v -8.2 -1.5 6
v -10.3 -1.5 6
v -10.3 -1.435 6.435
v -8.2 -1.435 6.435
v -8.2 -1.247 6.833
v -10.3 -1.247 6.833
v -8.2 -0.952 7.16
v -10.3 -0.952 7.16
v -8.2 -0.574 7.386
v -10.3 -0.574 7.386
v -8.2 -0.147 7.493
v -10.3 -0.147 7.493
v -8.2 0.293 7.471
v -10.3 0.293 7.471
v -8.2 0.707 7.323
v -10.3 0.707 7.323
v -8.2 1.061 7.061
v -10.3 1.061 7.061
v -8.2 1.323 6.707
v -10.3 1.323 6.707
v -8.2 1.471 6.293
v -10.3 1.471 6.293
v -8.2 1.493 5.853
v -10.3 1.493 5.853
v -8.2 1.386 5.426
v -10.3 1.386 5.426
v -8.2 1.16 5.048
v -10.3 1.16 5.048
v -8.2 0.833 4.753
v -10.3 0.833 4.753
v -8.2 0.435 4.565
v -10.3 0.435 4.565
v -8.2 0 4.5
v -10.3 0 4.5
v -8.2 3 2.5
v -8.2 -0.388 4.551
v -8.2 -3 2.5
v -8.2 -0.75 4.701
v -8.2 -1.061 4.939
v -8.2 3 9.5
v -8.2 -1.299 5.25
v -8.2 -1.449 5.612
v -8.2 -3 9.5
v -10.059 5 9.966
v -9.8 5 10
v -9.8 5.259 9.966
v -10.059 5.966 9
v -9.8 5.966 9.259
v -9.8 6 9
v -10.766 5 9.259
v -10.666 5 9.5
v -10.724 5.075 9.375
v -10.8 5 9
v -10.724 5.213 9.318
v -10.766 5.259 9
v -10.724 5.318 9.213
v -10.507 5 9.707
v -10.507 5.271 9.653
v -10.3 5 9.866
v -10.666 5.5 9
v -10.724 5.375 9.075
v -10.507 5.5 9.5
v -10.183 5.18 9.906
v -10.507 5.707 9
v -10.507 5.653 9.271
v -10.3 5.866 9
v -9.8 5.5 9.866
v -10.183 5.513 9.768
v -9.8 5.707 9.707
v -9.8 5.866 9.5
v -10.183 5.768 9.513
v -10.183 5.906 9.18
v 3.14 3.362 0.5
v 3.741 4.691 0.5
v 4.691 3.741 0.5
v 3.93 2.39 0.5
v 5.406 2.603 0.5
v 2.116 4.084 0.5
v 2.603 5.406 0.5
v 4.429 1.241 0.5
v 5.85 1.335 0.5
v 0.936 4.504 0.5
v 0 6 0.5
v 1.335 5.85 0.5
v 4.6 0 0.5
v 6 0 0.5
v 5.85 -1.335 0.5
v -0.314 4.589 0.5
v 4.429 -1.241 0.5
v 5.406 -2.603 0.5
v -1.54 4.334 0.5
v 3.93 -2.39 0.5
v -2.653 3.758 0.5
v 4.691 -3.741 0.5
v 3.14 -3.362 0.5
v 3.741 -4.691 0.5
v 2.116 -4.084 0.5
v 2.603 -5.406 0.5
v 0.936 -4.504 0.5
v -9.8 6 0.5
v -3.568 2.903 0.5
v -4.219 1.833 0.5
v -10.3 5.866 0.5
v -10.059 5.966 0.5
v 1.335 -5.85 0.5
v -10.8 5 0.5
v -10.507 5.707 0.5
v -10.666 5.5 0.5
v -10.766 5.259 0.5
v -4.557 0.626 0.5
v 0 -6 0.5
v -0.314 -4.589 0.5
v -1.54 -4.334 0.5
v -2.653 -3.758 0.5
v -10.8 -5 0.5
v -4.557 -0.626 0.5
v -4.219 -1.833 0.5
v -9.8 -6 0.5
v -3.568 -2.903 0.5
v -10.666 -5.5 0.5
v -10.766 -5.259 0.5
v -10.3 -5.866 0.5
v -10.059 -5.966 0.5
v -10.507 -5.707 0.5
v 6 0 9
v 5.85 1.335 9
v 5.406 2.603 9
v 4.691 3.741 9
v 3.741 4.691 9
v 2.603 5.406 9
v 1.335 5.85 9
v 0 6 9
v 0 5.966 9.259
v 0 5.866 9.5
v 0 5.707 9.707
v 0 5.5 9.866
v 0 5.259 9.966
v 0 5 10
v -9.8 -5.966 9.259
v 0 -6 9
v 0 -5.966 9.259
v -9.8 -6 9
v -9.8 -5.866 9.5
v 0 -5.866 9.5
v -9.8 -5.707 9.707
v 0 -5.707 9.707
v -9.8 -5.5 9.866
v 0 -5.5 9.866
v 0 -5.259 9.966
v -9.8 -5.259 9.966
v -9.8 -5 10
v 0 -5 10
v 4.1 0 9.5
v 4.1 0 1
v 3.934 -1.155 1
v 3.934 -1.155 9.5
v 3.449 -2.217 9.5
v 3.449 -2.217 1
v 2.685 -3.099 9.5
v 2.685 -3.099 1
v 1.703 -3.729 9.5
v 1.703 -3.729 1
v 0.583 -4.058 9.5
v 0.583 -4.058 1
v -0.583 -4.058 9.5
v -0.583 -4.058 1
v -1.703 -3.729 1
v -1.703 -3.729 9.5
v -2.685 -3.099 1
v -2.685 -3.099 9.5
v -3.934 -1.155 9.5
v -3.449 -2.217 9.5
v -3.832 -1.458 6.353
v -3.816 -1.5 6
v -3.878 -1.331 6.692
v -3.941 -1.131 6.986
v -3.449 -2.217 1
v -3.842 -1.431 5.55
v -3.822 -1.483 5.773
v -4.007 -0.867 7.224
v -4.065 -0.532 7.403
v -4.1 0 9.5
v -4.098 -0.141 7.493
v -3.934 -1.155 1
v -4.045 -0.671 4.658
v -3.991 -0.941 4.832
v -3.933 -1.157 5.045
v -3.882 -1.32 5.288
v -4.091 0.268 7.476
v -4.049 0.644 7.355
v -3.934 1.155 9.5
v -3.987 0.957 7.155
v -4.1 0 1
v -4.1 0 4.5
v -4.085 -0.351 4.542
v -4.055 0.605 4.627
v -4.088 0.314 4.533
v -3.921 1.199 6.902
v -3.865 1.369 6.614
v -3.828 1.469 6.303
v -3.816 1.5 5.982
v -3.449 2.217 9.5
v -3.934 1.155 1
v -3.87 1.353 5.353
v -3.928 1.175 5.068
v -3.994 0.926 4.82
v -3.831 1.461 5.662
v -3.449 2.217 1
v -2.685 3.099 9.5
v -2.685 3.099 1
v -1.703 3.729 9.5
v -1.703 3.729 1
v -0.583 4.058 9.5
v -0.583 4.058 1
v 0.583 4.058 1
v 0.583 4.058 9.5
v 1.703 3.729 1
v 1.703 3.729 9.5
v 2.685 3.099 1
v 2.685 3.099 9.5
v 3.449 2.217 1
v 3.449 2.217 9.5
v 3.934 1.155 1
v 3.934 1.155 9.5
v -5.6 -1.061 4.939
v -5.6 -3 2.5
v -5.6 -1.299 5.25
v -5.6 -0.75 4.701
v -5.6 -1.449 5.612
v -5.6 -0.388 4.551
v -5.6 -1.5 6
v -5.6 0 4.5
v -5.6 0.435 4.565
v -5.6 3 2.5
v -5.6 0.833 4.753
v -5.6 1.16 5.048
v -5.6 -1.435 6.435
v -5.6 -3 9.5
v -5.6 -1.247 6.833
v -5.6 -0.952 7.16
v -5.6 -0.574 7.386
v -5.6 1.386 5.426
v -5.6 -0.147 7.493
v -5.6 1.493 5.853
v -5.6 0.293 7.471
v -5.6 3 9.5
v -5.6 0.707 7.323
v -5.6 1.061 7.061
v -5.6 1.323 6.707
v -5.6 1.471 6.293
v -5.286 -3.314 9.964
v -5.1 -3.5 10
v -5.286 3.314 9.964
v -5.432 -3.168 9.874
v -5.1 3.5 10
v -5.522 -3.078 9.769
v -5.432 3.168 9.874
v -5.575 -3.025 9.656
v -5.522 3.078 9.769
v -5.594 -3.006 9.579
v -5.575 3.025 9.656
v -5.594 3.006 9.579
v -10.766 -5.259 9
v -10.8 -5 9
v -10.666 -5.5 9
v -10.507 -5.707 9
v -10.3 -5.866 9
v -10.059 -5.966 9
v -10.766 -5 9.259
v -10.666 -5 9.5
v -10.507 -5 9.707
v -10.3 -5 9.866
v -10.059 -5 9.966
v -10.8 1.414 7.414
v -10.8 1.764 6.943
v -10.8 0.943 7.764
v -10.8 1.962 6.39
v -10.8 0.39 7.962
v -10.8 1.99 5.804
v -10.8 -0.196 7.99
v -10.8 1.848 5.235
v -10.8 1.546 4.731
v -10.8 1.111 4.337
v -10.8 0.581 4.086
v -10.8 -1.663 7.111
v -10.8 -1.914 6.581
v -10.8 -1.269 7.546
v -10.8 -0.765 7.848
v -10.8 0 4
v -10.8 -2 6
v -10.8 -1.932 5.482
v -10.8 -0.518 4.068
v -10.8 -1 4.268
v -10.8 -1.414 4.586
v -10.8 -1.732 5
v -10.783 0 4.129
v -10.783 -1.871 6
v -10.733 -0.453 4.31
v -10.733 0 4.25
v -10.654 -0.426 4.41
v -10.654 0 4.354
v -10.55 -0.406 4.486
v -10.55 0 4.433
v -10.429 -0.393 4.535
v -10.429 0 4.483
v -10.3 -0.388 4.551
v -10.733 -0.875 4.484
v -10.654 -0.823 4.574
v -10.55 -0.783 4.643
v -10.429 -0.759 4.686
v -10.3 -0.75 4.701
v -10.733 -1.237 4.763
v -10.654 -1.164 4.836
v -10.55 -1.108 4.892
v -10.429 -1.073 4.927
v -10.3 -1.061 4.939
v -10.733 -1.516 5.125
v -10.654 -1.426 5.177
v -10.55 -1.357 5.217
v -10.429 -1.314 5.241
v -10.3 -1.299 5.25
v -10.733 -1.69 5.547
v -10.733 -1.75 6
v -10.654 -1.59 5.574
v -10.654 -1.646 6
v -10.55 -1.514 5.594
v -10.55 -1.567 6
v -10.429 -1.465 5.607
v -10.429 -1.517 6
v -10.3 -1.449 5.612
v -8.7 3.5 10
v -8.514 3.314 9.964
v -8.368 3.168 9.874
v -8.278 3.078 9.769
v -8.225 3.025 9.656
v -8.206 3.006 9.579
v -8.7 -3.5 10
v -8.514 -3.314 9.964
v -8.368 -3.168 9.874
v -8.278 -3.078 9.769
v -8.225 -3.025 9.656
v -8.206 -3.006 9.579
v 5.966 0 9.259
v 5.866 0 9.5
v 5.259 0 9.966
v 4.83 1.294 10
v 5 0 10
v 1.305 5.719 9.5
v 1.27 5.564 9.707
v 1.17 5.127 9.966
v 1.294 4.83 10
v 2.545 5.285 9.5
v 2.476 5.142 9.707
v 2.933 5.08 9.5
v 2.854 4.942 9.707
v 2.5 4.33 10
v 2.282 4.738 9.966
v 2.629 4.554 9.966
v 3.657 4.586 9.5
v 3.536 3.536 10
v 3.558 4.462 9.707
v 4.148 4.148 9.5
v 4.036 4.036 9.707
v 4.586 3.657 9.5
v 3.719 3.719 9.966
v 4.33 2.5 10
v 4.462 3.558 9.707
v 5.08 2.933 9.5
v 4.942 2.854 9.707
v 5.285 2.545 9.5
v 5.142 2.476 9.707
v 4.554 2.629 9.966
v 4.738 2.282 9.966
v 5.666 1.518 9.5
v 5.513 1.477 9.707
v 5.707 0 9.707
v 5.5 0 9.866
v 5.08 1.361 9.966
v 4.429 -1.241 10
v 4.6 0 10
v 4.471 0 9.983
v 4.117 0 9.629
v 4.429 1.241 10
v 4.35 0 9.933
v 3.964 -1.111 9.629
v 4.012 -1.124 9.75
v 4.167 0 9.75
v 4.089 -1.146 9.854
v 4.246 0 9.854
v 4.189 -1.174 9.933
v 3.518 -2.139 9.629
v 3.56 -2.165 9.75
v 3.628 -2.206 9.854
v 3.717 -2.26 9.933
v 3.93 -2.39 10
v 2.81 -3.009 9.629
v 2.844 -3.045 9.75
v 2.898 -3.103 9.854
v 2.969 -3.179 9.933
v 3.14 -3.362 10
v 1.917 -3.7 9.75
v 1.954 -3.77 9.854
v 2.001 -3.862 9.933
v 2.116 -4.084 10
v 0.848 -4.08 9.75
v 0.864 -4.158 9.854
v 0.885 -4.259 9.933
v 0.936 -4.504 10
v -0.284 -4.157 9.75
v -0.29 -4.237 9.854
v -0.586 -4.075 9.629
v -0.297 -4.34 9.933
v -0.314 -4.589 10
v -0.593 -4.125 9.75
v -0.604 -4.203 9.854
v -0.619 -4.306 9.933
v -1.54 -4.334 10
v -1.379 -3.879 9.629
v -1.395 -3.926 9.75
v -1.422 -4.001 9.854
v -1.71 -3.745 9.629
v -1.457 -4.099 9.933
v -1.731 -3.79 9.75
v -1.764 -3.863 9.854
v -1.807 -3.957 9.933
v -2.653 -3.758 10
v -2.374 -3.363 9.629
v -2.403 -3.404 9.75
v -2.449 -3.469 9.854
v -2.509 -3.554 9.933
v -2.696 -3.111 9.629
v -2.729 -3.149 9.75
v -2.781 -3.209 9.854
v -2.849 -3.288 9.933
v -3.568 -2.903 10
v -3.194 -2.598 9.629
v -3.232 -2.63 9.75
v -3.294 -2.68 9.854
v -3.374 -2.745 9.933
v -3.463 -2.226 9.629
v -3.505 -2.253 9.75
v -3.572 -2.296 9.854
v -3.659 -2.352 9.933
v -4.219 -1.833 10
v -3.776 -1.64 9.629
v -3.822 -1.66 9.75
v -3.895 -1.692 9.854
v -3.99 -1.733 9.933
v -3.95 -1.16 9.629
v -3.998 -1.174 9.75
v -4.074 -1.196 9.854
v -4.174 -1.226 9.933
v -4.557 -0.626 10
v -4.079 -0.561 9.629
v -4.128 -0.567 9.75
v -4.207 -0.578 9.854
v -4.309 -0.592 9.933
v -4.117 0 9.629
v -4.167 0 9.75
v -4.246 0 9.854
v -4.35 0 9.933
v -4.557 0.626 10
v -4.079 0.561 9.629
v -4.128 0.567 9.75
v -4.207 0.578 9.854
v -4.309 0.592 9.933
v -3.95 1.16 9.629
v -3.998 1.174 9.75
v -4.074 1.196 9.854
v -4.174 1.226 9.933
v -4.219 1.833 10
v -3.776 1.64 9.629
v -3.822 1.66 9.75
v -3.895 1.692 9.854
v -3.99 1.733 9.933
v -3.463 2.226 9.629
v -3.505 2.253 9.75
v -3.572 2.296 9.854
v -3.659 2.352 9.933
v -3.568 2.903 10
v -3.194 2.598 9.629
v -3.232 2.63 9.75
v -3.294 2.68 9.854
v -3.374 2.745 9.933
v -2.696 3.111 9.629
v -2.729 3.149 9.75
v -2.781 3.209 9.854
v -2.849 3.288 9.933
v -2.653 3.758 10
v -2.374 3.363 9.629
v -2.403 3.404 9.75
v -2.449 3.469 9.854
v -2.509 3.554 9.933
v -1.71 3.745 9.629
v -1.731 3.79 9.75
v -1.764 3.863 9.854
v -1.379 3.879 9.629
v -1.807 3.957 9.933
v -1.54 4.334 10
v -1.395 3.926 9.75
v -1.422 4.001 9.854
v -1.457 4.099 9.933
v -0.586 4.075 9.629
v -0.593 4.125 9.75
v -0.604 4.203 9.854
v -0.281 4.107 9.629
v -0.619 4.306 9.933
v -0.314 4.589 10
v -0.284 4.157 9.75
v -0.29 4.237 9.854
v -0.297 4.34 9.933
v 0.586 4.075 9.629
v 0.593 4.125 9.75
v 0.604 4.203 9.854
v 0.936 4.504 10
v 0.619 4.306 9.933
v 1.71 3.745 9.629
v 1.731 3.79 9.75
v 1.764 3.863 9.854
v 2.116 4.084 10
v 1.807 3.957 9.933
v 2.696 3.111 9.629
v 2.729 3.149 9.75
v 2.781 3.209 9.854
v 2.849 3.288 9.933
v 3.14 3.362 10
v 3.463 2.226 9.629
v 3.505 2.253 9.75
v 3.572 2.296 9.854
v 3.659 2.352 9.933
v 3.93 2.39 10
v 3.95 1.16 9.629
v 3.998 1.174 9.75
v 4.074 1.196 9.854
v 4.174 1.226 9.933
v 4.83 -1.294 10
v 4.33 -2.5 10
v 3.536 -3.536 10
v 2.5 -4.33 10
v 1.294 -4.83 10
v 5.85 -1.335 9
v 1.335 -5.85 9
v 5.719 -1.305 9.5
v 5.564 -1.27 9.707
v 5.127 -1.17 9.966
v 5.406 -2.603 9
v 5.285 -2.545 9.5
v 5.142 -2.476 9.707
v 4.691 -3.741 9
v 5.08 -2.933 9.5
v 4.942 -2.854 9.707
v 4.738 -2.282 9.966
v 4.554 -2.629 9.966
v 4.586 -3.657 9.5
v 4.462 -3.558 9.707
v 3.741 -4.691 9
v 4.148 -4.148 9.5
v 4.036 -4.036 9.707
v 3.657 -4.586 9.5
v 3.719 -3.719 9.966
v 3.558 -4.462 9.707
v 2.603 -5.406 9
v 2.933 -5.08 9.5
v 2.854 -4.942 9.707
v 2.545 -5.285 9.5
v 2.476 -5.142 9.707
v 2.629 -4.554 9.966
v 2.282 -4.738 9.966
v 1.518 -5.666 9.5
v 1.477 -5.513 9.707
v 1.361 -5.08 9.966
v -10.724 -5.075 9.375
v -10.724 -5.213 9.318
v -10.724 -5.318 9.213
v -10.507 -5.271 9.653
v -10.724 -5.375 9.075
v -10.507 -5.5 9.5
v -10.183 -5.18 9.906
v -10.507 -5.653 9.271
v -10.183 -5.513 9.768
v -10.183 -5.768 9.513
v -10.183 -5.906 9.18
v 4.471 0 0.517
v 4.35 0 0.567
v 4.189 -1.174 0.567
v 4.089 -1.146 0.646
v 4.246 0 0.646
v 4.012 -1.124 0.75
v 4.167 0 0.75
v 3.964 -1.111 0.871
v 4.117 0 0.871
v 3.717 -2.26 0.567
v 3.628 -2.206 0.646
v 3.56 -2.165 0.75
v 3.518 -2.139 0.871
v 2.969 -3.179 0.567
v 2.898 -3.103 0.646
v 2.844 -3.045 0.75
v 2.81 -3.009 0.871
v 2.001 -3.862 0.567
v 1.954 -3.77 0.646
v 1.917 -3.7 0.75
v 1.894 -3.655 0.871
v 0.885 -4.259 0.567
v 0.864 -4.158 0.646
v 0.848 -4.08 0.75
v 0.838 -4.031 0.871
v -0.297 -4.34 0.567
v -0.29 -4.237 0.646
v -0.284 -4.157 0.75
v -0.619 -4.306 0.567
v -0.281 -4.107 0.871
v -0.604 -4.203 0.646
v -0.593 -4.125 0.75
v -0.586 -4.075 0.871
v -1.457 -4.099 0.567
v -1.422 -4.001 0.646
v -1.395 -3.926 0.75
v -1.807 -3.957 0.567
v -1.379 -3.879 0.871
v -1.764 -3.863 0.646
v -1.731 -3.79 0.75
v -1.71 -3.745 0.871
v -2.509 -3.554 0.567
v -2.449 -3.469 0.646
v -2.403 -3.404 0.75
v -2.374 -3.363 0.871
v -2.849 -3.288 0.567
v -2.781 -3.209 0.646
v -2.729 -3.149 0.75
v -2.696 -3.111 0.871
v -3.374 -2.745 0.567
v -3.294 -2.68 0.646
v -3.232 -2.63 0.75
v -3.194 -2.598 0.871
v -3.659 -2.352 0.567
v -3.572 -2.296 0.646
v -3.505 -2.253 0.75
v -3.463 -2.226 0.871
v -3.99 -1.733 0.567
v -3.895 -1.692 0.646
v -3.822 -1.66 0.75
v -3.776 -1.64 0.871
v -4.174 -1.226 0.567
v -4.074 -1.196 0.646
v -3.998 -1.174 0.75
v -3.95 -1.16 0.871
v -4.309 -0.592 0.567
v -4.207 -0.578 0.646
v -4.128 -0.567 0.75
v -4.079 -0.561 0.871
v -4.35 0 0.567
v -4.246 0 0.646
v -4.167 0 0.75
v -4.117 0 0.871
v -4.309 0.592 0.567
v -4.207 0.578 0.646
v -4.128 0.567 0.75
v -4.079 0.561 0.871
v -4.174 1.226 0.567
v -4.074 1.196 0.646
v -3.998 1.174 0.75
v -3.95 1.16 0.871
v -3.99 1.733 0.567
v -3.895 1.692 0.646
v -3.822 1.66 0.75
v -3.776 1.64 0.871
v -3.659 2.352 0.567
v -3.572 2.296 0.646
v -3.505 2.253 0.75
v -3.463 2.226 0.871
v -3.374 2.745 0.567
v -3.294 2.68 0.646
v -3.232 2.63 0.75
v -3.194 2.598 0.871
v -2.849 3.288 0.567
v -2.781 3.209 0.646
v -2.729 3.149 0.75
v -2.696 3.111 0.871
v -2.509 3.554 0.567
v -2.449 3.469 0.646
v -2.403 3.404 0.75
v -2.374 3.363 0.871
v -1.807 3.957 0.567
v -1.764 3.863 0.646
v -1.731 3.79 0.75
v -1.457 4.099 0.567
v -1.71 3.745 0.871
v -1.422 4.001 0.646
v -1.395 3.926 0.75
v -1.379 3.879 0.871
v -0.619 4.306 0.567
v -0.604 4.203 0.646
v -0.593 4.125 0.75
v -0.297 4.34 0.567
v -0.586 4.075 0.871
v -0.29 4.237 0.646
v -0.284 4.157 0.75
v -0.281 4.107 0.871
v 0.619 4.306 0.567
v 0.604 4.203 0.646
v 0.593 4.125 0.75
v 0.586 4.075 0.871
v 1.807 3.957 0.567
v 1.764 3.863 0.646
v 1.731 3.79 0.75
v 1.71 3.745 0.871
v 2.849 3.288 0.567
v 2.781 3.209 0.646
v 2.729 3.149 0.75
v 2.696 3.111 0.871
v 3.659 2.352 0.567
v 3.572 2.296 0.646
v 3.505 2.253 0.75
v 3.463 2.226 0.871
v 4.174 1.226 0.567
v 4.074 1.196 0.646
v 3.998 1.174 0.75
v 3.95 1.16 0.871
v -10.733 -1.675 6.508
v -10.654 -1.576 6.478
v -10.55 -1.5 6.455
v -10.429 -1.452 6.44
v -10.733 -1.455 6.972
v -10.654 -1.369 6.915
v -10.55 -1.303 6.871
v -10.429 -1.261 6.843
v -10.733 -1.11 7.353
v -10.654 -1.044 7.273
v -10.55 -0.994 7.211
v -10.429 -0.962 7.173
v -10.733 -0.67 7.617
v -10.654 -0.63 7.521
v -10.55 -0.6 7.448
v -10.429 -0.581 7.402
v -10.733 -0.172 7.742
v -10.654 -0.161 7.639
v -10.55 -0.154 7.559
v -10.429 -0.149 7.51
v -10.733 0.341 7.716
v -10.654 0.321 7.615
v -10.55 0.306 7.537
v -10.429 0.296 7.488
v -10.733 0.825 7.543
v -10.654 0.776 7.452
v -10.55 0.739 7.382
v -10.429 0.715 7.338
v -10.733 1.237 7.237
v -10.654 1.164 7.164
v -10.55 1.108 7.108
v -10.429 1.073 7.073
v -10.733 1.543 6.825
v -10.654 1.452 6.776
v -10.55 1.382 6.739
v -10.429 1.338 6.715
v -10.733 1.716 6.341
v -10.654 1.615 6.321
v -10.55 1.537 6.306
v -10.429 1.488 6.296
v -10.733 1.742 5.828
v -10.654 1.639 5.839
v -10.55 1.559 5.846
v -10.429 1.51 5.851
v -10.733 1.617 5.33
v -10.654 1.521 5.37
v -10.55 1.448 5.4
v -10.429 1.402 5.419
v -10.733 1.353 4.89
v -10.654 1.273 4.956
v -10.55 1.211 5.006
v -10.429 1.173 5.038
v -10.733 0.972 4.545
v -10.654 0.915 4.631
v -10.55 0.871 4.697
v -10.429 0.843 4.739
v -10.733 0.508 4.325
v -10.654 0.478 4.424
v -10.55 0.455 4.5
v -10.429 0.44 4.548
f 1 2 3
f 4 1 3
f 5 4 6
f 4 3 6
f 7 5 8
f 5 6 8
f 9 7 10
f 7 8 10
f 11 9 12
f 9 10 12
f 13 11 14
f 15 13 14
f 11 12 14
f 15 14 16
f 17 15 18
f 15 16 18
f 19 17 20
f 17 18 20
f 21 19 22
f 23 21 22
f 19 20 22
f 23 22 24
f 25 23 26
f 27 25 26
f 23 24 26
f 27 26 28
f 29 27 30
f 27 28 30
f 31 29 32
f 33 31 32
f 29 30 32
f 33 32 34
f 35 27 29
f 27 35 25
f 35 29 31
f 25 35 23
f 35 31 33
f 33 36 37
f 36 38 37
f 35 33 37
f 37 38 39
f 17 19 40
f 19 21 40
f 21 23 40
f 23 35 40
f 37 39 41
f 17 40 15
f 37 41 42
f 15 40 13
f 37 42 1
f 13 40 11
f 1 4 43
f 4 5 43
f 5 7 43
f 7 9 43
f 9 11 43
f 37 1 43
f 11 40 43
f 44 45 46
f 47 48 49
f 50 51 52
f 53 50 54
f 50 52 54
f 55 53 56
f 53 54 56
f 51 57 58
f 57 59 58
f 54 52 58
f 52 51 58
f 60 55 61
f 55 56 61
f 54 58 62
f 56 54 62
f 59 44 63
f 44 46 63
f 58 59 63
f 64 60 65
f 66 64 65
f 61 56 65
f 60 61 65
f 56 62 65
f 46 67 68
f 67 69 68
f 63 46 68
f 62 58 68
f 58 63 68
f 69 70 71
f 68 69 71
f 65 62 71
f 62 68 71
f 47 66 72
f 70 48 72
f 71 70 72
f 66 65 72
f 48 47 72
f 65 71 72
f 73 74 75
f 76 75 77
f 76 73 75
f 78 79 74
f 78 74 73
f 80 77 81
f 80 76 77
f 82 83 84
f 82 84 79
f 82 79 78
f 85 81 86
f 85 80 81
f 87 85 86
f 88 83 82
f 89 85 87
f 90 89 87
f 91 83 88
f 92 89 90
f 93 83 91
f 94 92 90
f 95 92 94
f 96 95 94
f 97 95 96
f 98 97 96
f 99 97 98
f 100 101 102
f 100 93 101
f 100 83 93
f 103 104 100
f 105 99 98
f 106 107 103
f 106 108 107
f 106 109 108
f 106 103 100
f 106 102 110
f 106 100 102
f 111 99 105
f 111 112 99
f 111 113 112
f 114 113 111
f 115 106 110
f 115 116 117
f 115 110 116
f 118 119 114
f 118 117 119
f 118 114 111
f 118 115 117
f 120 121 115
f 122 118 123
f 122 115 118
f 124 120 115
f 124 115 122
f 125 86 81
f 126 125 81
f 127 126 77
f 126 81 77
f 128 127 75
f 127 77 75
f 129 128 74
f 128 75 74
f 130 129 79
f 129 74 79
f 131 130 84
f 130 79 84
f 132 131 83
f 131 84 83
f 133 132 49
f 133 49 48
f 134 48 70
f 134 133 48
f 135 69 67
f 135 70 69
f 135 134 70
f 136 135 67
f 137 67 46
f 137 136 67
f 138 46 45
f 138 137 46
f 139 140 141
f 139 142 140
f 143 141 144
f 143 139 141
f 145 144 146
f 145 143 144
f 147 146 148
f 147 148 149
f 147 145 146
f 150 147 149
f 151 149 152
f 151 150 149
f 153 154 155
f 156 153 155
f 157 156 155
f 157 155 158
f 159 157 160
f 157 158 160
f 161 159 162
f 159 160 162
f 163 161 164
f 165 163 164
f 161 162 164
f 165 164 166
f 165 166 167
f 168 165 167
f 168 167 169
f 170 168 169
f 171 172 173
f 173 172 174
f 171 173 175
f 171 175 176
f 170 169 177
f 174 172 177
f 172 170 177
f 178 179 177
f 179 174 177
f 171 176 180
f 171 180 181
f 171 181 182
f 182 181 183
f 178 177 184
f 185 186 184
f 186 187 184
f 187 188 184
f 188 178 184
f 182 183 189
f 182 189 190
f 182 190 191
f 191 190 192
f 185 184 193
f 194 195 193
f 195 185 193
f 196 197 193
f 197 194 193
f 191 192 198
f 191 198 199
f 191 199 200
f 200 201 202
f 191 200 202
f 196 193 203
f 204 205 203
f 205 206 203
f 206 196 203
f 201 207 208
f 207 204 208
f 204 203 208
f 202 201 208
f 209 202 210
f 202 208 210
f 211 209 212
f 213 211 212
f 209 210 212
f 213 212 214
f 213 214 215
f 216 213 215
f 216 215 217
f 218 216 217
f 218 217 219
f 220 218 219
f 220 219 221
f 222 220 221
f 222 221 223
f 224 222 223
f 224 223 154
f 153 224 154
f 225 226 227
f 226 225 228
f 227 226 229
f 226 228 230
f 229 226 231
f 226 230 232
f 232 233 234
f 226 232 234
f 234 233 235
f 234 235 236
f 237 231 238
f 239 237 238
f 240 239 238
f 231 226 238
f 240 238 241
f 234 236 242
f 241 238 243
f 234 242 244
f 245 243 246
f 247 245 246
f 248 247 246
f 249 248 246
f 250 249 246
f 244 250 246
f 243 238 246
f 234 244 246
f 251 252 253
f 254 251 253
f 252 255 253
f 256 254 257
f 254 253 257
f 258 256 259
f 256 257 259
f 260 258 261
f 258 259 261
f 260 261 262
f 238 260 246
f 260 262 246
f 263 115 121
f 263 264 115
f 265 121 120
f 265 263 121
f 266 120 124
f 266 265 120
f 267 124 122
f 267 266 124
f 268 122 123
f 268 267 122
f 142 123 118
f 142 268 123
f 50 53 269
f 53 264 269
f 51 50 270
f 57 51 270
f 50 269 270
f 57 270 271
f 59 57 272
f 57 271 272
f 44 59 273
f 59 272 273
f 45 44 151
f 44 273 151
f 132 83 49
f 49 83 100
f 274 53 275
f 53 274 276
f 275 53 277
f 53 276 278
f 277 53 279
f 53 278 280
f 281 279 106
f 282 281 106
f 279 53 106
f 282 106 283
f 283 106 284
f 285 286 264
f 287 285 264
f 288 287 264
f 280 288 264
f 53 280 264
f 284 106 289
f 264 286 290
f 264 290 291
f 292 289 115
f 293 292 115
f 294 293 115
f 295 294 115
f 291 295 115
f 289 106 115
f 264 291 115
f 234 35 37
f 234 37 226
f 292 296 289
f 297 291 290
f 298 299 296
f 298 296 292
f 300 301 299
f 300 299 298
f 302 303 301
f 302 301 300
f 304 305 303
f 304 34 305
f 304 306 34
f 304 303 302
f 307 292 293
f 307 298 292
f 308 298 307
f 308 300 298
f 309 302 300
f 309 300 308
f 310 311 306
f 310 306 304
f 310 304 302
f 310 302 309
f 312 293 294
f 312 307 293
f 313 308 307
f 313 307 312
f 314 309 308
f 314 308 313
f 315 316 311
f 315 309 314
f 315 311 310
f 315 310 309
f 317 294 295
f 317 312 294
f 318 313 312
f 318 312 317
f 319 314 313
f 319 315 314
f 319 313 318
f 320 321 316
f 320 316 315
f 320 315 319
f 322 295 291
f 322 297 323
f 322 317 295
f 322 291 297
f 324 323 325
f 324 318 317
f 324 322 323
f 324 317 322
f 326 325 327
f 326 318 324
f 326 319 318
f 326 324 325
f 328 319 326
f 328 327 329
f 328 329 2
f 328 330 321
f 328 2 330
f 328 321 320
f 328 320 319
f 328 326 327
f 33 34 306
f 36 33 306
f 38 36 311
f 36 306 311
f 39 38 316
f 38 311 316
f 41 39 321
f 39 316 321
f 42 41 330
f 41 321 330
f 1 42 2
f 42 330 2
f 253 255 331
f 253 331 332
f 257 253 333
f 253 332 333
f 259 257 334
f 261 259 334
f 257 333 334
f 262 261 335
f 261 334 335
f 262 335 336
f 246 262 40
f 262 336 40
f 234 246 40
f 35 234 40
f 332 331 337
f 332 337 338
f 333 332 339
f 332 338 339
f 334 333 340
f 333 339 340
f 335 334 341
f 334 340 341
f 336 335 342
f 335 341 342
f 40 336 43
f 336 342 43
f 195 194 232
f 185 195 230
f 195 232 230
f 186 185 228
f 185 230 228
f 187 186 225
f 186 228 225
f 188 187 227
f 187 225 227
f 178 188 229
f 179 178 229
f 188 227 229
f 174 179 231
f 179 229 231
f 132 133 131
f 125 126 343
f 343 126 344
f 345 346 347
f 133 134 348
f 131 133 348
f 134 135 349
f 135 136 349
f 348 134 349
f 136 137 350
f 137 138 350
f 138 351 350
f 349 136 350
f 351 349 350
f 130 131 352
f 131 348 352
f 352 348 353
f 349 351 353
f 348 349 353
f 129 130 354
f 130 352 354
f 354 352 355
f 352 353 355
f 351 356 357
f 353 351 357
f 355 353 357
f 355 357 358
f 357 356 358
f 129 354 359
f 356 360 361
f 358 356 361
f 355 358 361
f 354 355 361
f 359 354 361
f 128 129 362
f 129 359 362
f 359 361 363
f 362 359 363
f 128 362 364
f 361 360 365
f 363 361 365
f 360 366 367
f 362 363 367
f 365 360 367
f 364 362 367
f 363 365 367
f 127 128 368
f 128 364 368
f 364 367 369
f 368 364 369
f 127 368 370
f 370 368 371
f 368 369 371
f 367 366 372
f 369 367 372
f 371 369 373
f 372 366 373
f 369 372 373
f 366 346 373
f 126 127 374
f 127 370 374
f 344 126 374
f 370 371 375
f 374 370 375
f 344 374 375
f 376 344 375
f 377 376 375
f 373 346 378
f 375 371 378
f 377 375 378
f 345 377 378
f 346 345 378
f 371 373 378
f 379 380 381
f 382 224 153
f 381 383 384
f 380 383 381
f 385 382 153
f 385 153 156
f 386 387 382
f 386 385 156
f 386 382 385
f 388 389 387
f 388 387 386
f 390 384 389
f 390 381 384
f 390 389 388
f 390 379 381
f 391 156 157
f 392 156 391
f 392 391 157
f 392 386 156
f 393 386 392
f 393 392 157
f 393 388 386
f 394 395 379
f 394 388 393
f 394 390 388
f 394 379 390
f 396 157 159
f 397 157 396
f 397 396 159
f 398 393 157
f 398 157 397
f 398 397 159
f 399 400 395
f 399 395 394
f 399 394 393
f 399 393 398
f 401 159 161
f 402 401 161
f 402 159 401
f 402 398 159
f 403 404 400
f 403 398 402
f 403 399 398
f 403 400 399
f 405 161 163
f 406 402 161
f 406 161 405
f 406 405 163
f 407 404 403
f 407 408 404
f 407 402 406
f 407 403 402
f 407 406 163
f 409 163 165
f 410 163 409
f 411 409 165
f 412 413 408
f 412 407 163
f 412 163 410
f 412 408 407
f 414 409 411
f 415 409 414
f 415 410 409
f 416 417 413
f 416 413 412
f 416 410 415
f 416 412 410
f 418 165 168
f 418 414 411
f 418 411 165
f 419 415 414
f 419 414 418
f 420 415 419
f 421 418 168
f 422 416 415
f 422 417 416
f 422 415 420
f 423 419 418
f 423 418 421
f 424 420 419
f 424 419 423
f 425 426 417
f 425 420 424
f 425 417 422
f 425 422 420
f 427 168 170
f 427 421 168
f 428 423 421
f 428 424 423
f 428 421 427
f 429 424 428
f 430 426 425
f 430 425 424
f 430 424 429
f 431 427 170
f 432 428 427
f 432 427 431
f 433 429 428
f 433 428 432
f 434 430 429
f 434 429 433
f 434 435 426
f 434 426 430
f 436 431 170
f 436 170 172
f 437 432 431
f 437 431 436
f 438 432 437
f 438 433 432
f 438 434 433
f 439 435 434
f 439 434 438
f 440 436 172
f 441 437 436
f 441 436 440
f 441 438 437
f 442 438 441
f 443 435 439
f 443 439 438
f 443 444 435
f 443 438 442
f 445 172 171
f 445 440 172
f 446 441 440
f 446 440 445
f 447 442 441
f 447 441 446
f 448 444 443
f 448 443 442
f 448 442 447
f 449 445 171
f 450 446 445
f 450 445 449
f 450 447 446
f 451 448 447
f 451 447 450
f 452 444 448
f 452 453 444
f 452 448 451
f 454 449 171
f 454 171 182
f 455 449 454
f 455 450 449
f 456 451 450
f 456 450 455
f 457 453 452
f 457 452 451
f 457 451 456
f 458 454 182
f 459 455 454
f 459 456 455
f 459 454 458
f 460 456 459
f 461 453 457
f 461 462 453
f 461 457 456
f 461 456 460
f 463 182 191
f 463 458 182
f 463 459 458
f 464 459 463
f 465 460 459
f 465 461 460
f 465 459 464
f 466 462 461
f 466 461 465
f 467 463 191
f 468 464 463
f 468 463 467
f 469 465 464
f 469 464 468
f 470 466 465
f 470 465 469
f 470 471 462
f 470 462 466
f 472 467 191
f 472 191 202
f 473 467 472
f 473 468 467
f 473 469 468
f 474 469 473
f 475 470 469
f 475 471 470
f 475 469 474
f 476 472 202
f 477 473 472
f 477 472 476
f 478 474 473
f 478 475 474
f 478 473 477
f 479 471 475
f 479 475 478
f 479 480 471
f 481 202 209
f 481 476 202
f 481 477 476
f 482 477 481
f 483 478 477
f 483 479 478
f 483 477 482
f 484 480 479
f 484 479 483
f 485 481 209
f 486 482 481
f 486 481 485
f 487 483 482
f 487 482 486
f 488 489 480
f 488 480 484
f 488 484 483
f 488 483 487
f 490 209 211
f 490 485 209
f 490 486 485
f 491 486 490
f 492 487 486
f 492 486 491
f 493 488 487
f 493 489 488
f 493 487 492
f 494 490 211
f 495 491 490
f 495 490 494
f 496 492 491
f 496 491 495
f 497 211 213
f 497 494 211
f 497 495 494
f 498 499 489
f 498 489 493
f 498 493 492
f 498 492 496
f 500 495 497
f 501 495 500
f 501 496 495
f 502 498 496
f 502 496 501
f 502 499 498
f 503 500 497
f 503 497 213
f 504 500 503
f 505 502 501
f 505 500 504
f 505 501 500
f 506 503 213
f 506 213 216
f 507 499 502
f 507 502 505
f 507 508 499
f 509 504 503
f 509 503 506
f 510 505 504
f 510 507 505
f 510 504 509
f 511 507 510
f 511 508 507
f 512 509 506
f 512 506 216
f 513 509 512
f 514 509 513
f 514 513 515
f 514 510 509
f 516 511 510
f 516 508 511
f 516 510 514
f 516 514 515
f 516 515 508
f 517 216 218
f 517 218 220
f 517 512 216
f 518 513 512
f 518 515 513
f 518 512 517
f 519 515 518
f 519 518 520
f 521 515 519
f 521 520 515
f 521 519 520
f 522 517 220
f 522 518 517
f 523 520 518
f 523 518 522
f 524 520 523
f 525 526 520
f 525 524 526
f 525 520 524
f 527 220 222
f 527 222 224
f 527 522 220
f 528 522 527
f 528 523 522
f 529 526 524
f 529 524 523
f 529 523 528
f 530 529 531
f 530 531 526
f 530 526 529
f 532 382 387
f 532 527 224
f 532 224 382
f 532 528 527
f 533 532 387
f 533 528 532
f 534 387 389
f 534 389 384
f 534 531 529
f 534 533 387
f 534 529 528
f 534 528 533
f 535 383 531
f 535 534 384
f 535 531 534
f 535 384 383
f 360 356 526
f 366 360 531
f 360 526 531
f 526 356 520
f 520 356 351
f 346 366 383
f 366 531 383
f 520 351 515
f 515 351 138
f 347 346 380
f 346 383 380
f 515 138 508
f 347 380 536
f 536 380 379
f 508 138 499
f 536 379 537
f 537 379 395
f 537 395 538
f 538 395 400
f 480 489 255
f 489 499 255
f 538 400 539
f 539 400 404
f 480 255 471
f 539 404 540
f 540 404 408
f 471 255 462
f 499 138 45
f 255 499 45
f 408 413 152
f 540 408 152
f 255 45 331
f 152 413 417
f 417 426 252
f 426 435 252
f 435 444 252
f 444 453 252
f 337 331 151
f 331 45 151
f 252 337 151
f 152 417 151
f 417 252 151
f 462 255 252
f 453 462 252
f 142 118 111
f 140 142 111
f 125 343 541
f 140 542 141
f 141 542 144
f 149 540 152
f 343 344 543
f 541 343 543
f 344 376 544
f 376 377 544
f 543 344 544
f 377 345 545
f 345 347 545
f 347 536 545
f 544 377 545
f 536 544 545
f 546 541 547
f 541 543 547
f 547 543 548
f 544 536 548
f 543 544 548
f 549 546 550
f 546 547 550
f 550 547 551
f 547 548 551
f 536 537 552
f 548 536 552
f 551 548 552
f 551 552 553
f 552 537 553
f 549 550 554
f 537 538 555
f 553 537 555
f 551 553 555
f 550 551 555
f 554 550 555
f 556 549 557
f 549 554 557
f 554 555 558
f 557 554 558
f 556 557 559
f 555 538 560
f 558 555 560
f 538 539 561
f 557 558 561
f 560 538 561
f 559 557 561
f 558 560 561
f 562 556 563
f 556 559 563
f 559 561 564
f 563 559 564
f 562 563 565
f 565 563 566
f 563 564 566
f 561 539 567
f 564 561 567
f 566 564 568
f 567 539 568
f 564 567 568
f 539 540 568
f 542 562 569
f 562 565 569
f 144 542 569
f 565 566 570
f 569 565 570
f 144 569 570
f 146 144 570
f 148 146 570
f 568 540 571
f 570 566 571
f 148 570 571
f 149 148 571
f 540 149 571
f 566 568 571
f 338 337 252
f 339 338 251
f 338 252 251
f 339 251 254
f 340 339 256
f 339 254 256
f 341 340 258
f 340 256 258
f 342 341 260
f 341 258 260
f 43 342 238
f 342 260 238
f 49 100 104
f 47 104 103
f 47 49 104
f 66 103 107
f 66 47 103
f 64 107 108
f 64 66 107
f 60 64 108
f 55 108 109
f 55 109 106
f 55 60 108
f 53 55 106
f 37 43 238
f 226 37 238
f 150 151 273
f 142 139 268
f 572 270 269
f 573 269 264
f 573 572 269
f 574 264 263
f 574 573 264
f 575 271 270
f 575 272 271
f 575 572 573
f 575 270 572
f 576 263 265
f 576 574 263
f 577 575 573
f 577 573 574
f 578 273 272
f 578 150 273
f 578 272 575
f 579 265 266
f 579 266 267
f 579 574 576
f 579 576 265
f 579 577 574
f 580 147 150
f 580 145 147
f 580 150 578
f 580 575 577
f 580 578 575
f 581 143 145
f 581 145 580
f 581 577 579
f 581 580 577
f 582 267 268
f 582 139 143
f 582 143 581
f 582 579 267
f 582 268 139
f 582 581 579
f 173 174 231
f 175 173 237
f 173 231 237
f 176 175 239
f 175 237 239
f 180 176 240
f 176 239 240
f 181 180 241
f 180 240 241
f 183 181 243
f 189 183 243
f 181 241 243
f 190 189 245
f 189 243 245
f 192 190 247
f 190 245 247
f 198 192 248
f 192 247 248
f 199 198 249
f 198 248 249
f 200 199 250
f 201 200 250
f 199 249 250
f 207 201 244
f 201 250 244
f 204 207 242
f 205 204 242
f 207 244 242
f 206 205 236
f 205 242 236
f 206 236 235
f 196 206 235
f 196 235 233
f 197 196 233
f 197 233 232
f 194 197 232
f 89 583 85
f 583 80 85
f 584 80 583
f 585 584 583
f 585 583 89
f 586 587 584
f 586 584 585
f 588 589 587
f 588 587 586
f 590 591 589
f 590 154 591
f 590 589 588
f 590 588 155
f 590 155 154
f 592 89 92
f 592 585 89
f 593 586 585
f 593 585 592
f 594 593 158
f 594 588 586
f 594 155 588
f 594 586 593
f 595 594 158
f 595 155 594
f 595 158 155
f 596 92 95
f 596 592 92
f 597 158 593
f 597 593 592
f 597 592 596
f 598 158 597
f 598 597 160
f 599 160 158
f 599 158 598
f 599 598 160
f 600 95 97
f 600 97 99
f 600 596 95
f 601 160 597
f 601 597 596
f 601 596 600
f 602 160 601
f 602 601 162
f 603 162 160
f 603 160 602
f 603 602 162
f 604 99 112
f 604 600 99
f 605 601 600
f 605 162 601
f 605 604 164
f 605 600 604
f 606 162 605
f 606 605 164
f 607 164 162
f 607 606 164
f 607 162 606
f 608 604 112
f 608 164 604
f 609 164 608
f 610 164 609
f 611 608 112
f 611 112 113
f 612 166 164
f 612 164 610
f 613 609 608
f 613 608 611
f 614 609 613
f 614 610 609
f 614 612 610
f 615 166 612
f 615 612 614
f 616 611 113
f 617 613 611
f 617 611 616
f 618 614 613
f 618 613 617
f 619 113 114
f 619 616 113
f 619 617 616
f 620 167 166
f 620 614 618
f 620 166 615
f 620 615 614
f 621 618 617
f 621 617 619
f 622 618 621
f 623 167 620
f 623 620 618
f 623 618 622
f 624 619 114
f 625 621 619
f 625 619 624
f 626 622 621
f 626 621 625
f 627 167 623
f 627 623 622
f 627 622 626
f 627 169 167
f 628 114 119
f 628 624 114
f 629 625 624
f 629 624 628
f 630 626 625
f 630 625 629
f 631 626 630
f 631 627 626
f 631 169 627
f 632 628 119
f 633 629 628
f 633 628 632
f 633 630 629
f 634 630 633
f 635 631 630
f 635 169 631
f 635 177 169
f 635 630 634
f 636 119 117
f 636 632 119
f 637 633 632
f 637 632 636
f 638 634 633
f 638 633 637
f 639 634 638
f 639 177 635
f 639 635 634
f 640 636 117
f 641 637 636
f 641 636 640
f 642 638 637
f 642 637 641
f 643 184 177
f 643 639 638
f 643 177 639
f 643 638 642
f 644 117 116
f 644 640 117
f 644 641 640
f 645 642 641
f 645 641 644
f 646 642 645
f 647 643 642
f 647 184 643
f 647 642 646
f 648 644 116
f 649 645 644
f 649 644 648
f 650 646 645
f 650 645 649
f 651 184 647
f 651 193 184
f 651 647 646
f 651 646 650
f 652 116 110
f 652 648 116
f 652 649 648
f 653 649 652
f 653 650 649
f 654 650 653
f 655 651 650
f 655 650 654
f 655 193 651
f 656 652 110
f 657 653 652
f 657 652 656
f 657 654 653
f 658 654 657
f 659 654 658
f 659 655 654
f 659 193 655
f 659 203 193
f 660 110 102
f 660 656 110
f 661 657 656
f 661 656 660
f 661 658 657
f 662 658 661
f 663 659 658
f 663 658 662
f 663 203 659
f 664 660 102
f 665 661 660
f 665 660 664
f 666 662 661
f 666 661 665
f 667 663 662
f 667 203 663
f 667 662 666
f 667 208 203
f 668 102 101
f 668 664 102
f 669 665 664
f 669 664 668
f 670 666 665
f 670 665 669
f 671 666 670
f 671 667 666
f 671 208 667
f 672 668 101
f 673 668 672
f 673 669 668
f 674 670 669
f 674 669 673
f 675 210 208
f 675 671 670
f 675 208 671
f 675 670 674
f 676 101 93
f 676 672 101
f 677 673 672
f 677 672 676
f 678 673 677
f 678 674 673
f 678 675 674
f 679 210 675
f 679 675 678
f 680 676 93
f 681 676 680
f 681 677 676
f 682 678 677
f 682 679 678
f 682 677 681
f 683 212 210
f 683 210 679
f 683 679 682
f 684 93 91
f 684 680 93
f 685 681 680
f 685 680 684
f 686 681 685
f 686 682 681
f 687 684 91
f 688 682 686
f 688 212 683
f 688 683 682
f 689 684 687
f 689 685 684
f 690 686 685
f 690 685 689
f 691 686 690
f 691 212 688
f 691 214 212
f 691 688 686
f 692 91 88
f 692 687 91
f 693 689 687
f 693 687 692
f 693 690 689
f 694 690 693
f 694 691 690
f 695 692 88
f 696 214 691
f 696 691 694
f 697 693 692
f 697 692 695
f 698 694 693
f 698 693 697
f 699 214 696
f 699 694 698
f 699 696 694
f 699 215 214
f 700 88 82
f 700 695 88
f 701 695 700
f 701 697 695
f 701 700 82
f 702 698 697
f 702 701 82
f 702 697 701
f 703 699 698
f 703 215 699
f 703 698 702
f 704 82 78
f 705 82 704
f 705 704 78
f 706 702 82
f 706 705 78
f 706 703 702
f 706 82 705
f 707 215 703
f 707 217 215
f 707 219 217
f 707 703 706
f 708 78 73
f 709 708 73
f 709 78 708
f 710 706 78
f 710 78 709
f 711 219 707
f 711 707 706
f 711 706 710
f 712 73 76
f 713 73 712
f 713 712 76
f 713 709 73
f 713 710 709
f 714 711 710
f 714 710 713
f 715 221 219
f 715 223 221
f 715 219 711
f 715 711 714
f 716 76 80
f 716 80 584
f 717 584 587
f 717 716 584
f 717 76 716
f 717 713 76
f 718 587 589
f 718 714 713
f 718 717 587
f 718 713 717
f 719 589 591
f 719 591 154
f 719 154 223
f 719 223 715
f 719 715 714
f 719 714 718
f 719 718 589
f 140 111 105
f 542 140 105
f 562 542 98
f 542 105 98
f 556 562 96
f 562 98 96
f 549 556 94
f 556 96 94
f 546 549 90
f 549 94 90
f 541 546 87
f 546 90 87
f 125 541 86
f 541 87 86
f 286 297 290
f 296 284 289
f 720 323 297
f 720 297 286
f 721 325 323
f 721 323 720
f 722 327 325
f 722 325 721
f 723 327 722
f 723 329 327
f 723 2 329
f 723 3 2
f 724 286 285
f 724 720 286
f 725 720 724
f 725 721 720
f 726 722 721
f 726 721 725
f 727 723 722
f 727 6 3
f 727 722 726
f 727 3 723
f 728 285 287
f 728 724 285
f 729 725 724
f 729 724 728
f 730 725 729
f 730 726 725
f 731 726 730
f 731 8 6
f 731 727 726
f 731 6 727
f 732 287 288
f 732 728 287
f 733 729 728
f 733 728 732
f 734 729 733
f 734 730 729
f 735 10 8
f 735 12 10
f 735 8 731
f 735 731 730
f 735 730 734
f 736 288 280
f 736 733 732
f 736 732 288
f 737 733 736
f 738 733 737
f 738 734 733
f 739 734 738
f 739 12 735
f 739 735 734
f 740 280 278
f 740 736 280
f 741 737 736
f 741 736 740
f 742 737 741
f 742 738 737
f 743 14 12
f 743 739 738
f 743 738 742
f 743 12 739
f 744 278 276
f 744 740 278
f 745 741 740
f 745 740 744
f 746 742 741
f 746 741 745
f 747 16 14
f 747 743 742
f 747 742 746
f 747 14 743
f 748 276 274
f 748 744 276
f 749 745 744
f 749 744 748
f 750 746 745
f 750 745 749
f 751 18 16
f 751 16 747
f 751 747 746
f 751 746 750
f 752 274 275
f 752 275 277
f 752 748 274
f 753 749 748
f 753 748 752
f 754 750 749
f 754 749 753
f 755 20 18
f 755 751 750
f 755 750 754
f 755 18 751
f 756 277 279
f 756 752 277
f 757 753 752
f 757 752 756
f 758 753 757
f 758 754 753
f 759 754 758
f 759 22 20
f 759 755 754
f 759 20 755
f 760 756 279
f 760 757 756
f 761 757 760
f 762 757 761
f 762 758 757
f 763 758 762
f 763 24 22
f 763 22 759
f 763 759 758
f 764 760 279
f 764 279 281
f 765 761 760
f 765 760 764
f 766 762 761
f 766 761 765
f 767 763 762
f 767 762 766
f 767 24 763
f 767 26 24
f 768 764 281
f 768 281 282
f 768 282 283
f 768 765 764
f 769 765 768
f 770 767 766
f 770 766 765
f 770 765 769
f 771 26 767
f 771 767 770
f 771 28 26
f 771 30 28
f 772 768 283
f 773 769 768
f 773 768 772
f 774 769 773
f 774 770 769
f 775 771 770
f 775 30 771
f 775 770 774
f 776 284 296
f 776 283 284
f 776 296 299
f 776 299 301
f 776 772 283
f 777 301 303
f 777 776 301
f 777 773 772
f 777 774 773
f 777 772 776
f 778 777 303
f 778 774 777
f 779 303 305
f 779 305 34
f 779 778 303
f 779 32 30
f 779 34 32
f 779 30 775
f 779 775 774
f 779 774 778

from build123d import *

# Parameters (mm, degrees)
F0_R      = 4.1
F1_DEPTH  = 12
F2_DEPTH  = 12
F4_DEPTH  = 3
F6_DEPTH  = 8
F7_DEPTH  = 9.5
F8_W      = 12
F8_H      = 2
F8_H_2    = 0.5
F9_DEPTH  = 25
F10_R     = 1
F11_R     = 0.5
F12_R     = 4.1
F13_DEPTH = 25
F14_DEPTH = 25


with BuildPart() as f1:
    # F0 (on Top) → F1 (new body)
    with BuildSketch(Plane.XY):
        with BuildLine():
            ThreePointArc((0, -6), (4.2426406871, -4.2426406871), (6, 0))
            ThreePointArc((6, 0), (4.2426406871, 4.2426406871), (0, 6))
            ThreePointArc((0, 6), (-4.2426406871, 4.2426406871), (-6, 0))
            ThreePointArc((-6, 0), (-4.2426406871, -4.2426406871), (0, -6))
        make_face()
        Circle(F0_R, mode=Mode.SUBTRACT)
    extrude(amount=F1_DEPTH)

    # F0 (on Top) → F2 (join)
    with BuildSketch(Plane.XY):
        with BuildLine():
            ThreePointArc((-6, 0), (-4.2426406871, 4.2426406871), (0, 6))
            Line((0, 6), (-6, 6))
            Line((-6, 6), (-6, 0))
        make_face()
        with BuildLine():
            Line((-6, -6), (0, -6))
            ThreePointArc((0, -6), (-4.2426406871, -4.2426406871), (-6, 0))
            Line((-6, 0), (-6, -6))
        make_face()
        Polygon((-6, -6), (-6, 0), (-6, 6), (-10.8, 6), (-10.8, -6), align=None)
    extrude(amount=F2_DEPTH)

    # F3 (on face) → F4 (cut)
    with BuildSketch(Plane.XY.offset(12)):
        Polygon((-5.6, -3), (-5.6, 0), (-5.6, 3), (-8.2, 3), (-8.2, -3), align=None)
    extrude(amount=F4_DEPTH, mode=Mode.SUBTRACT)

    # F5 (on face) → F6 (cut)
    with BuildSketch(Plane(origin=(-10.8, 0, 0), x_dir=(0, -1, 0), z_dir=(-1, 0, 0))):
        with BuildLine():
            ThreePointArc((0, 4.5), (1.0606601718, 4.9393398282), (1.5, 6))
            ThreePointArc((1.5, 6), (-1.0606601718, 7.0606601718), (0, 4.5))
        make_face()
    extrude(amount=-F6_DEPTH, mode=Mode.SUBTRACT)

    # F3 (on face) → F7 (cut)
    with BuildSketch(Plane.XY.offset(12)):
        Polygon((-5.6, -3), (-5.6, 0), (-5.6, 3), (-8.2, 3), (-8.2, -3), align=None)
    extrude(amount=-F7_DEPTH, mode=Mode.SUBTRACT)

    # F8 (on face) → F9 (cut)
    with BuildSketch(Plane(origin=(-10.8, 0, 0), x_dir=(0, -1, 0), z_dir=(-1, 0, 0))):
        with Locations((0, 11)):
            Rectangle(F8_W, F8_H)
        with Locations((0, 0.25)):
            Rectangle(F8_W, F8_H_2)
    extrude(amount=-F9_DEPTH, mode=Mode.SUBTRACT)

    # F10
    f10_edges = [f1.edges().sort_by_distance(p)[0] for p in [
        (-5.4, 6, 10),
        (-10.8, 0, 10),
        (-10.8, 6, 5.25),
        (-10.8, -6, 5.25),
    ]]
    fillet(f10_edges, radius=F10_R)

    # F11
    f11_edges = [f1.edges().sort_by_distance(p)[0] for p in [
        (-10.8, 0, 7.5),
        (-8.2, 0, 10),
        (-6.9, 3, 10),
        (-5.6, 0, 10),
        (-6.9, -3, 10),
        (-4.1, 0, 10),
        (-4.1, 0, 0.5),
    ]]
    fillet(f11_edges, radius=F11_R)

    # F12 (on face) → F13 (join)
    with BuildSketch(Plane(origin=(0, 0, 0.5), x_dir=(1, 0, 0), z_dir=(0, 0, -1))):
        Circle(F12_R)
    extrude(amount=-F13_DEPTH)

    # F14 (cut): a face of the model
    f14_faces = [f1.faces().sort_by_distance(p)[0] for p in [
        (0, 0, 0.5),
    ]]
    extrude(f14_faces, amount=-F14_DEPTH, mode=Mode.SUBTRACT)


solid = f1.part
